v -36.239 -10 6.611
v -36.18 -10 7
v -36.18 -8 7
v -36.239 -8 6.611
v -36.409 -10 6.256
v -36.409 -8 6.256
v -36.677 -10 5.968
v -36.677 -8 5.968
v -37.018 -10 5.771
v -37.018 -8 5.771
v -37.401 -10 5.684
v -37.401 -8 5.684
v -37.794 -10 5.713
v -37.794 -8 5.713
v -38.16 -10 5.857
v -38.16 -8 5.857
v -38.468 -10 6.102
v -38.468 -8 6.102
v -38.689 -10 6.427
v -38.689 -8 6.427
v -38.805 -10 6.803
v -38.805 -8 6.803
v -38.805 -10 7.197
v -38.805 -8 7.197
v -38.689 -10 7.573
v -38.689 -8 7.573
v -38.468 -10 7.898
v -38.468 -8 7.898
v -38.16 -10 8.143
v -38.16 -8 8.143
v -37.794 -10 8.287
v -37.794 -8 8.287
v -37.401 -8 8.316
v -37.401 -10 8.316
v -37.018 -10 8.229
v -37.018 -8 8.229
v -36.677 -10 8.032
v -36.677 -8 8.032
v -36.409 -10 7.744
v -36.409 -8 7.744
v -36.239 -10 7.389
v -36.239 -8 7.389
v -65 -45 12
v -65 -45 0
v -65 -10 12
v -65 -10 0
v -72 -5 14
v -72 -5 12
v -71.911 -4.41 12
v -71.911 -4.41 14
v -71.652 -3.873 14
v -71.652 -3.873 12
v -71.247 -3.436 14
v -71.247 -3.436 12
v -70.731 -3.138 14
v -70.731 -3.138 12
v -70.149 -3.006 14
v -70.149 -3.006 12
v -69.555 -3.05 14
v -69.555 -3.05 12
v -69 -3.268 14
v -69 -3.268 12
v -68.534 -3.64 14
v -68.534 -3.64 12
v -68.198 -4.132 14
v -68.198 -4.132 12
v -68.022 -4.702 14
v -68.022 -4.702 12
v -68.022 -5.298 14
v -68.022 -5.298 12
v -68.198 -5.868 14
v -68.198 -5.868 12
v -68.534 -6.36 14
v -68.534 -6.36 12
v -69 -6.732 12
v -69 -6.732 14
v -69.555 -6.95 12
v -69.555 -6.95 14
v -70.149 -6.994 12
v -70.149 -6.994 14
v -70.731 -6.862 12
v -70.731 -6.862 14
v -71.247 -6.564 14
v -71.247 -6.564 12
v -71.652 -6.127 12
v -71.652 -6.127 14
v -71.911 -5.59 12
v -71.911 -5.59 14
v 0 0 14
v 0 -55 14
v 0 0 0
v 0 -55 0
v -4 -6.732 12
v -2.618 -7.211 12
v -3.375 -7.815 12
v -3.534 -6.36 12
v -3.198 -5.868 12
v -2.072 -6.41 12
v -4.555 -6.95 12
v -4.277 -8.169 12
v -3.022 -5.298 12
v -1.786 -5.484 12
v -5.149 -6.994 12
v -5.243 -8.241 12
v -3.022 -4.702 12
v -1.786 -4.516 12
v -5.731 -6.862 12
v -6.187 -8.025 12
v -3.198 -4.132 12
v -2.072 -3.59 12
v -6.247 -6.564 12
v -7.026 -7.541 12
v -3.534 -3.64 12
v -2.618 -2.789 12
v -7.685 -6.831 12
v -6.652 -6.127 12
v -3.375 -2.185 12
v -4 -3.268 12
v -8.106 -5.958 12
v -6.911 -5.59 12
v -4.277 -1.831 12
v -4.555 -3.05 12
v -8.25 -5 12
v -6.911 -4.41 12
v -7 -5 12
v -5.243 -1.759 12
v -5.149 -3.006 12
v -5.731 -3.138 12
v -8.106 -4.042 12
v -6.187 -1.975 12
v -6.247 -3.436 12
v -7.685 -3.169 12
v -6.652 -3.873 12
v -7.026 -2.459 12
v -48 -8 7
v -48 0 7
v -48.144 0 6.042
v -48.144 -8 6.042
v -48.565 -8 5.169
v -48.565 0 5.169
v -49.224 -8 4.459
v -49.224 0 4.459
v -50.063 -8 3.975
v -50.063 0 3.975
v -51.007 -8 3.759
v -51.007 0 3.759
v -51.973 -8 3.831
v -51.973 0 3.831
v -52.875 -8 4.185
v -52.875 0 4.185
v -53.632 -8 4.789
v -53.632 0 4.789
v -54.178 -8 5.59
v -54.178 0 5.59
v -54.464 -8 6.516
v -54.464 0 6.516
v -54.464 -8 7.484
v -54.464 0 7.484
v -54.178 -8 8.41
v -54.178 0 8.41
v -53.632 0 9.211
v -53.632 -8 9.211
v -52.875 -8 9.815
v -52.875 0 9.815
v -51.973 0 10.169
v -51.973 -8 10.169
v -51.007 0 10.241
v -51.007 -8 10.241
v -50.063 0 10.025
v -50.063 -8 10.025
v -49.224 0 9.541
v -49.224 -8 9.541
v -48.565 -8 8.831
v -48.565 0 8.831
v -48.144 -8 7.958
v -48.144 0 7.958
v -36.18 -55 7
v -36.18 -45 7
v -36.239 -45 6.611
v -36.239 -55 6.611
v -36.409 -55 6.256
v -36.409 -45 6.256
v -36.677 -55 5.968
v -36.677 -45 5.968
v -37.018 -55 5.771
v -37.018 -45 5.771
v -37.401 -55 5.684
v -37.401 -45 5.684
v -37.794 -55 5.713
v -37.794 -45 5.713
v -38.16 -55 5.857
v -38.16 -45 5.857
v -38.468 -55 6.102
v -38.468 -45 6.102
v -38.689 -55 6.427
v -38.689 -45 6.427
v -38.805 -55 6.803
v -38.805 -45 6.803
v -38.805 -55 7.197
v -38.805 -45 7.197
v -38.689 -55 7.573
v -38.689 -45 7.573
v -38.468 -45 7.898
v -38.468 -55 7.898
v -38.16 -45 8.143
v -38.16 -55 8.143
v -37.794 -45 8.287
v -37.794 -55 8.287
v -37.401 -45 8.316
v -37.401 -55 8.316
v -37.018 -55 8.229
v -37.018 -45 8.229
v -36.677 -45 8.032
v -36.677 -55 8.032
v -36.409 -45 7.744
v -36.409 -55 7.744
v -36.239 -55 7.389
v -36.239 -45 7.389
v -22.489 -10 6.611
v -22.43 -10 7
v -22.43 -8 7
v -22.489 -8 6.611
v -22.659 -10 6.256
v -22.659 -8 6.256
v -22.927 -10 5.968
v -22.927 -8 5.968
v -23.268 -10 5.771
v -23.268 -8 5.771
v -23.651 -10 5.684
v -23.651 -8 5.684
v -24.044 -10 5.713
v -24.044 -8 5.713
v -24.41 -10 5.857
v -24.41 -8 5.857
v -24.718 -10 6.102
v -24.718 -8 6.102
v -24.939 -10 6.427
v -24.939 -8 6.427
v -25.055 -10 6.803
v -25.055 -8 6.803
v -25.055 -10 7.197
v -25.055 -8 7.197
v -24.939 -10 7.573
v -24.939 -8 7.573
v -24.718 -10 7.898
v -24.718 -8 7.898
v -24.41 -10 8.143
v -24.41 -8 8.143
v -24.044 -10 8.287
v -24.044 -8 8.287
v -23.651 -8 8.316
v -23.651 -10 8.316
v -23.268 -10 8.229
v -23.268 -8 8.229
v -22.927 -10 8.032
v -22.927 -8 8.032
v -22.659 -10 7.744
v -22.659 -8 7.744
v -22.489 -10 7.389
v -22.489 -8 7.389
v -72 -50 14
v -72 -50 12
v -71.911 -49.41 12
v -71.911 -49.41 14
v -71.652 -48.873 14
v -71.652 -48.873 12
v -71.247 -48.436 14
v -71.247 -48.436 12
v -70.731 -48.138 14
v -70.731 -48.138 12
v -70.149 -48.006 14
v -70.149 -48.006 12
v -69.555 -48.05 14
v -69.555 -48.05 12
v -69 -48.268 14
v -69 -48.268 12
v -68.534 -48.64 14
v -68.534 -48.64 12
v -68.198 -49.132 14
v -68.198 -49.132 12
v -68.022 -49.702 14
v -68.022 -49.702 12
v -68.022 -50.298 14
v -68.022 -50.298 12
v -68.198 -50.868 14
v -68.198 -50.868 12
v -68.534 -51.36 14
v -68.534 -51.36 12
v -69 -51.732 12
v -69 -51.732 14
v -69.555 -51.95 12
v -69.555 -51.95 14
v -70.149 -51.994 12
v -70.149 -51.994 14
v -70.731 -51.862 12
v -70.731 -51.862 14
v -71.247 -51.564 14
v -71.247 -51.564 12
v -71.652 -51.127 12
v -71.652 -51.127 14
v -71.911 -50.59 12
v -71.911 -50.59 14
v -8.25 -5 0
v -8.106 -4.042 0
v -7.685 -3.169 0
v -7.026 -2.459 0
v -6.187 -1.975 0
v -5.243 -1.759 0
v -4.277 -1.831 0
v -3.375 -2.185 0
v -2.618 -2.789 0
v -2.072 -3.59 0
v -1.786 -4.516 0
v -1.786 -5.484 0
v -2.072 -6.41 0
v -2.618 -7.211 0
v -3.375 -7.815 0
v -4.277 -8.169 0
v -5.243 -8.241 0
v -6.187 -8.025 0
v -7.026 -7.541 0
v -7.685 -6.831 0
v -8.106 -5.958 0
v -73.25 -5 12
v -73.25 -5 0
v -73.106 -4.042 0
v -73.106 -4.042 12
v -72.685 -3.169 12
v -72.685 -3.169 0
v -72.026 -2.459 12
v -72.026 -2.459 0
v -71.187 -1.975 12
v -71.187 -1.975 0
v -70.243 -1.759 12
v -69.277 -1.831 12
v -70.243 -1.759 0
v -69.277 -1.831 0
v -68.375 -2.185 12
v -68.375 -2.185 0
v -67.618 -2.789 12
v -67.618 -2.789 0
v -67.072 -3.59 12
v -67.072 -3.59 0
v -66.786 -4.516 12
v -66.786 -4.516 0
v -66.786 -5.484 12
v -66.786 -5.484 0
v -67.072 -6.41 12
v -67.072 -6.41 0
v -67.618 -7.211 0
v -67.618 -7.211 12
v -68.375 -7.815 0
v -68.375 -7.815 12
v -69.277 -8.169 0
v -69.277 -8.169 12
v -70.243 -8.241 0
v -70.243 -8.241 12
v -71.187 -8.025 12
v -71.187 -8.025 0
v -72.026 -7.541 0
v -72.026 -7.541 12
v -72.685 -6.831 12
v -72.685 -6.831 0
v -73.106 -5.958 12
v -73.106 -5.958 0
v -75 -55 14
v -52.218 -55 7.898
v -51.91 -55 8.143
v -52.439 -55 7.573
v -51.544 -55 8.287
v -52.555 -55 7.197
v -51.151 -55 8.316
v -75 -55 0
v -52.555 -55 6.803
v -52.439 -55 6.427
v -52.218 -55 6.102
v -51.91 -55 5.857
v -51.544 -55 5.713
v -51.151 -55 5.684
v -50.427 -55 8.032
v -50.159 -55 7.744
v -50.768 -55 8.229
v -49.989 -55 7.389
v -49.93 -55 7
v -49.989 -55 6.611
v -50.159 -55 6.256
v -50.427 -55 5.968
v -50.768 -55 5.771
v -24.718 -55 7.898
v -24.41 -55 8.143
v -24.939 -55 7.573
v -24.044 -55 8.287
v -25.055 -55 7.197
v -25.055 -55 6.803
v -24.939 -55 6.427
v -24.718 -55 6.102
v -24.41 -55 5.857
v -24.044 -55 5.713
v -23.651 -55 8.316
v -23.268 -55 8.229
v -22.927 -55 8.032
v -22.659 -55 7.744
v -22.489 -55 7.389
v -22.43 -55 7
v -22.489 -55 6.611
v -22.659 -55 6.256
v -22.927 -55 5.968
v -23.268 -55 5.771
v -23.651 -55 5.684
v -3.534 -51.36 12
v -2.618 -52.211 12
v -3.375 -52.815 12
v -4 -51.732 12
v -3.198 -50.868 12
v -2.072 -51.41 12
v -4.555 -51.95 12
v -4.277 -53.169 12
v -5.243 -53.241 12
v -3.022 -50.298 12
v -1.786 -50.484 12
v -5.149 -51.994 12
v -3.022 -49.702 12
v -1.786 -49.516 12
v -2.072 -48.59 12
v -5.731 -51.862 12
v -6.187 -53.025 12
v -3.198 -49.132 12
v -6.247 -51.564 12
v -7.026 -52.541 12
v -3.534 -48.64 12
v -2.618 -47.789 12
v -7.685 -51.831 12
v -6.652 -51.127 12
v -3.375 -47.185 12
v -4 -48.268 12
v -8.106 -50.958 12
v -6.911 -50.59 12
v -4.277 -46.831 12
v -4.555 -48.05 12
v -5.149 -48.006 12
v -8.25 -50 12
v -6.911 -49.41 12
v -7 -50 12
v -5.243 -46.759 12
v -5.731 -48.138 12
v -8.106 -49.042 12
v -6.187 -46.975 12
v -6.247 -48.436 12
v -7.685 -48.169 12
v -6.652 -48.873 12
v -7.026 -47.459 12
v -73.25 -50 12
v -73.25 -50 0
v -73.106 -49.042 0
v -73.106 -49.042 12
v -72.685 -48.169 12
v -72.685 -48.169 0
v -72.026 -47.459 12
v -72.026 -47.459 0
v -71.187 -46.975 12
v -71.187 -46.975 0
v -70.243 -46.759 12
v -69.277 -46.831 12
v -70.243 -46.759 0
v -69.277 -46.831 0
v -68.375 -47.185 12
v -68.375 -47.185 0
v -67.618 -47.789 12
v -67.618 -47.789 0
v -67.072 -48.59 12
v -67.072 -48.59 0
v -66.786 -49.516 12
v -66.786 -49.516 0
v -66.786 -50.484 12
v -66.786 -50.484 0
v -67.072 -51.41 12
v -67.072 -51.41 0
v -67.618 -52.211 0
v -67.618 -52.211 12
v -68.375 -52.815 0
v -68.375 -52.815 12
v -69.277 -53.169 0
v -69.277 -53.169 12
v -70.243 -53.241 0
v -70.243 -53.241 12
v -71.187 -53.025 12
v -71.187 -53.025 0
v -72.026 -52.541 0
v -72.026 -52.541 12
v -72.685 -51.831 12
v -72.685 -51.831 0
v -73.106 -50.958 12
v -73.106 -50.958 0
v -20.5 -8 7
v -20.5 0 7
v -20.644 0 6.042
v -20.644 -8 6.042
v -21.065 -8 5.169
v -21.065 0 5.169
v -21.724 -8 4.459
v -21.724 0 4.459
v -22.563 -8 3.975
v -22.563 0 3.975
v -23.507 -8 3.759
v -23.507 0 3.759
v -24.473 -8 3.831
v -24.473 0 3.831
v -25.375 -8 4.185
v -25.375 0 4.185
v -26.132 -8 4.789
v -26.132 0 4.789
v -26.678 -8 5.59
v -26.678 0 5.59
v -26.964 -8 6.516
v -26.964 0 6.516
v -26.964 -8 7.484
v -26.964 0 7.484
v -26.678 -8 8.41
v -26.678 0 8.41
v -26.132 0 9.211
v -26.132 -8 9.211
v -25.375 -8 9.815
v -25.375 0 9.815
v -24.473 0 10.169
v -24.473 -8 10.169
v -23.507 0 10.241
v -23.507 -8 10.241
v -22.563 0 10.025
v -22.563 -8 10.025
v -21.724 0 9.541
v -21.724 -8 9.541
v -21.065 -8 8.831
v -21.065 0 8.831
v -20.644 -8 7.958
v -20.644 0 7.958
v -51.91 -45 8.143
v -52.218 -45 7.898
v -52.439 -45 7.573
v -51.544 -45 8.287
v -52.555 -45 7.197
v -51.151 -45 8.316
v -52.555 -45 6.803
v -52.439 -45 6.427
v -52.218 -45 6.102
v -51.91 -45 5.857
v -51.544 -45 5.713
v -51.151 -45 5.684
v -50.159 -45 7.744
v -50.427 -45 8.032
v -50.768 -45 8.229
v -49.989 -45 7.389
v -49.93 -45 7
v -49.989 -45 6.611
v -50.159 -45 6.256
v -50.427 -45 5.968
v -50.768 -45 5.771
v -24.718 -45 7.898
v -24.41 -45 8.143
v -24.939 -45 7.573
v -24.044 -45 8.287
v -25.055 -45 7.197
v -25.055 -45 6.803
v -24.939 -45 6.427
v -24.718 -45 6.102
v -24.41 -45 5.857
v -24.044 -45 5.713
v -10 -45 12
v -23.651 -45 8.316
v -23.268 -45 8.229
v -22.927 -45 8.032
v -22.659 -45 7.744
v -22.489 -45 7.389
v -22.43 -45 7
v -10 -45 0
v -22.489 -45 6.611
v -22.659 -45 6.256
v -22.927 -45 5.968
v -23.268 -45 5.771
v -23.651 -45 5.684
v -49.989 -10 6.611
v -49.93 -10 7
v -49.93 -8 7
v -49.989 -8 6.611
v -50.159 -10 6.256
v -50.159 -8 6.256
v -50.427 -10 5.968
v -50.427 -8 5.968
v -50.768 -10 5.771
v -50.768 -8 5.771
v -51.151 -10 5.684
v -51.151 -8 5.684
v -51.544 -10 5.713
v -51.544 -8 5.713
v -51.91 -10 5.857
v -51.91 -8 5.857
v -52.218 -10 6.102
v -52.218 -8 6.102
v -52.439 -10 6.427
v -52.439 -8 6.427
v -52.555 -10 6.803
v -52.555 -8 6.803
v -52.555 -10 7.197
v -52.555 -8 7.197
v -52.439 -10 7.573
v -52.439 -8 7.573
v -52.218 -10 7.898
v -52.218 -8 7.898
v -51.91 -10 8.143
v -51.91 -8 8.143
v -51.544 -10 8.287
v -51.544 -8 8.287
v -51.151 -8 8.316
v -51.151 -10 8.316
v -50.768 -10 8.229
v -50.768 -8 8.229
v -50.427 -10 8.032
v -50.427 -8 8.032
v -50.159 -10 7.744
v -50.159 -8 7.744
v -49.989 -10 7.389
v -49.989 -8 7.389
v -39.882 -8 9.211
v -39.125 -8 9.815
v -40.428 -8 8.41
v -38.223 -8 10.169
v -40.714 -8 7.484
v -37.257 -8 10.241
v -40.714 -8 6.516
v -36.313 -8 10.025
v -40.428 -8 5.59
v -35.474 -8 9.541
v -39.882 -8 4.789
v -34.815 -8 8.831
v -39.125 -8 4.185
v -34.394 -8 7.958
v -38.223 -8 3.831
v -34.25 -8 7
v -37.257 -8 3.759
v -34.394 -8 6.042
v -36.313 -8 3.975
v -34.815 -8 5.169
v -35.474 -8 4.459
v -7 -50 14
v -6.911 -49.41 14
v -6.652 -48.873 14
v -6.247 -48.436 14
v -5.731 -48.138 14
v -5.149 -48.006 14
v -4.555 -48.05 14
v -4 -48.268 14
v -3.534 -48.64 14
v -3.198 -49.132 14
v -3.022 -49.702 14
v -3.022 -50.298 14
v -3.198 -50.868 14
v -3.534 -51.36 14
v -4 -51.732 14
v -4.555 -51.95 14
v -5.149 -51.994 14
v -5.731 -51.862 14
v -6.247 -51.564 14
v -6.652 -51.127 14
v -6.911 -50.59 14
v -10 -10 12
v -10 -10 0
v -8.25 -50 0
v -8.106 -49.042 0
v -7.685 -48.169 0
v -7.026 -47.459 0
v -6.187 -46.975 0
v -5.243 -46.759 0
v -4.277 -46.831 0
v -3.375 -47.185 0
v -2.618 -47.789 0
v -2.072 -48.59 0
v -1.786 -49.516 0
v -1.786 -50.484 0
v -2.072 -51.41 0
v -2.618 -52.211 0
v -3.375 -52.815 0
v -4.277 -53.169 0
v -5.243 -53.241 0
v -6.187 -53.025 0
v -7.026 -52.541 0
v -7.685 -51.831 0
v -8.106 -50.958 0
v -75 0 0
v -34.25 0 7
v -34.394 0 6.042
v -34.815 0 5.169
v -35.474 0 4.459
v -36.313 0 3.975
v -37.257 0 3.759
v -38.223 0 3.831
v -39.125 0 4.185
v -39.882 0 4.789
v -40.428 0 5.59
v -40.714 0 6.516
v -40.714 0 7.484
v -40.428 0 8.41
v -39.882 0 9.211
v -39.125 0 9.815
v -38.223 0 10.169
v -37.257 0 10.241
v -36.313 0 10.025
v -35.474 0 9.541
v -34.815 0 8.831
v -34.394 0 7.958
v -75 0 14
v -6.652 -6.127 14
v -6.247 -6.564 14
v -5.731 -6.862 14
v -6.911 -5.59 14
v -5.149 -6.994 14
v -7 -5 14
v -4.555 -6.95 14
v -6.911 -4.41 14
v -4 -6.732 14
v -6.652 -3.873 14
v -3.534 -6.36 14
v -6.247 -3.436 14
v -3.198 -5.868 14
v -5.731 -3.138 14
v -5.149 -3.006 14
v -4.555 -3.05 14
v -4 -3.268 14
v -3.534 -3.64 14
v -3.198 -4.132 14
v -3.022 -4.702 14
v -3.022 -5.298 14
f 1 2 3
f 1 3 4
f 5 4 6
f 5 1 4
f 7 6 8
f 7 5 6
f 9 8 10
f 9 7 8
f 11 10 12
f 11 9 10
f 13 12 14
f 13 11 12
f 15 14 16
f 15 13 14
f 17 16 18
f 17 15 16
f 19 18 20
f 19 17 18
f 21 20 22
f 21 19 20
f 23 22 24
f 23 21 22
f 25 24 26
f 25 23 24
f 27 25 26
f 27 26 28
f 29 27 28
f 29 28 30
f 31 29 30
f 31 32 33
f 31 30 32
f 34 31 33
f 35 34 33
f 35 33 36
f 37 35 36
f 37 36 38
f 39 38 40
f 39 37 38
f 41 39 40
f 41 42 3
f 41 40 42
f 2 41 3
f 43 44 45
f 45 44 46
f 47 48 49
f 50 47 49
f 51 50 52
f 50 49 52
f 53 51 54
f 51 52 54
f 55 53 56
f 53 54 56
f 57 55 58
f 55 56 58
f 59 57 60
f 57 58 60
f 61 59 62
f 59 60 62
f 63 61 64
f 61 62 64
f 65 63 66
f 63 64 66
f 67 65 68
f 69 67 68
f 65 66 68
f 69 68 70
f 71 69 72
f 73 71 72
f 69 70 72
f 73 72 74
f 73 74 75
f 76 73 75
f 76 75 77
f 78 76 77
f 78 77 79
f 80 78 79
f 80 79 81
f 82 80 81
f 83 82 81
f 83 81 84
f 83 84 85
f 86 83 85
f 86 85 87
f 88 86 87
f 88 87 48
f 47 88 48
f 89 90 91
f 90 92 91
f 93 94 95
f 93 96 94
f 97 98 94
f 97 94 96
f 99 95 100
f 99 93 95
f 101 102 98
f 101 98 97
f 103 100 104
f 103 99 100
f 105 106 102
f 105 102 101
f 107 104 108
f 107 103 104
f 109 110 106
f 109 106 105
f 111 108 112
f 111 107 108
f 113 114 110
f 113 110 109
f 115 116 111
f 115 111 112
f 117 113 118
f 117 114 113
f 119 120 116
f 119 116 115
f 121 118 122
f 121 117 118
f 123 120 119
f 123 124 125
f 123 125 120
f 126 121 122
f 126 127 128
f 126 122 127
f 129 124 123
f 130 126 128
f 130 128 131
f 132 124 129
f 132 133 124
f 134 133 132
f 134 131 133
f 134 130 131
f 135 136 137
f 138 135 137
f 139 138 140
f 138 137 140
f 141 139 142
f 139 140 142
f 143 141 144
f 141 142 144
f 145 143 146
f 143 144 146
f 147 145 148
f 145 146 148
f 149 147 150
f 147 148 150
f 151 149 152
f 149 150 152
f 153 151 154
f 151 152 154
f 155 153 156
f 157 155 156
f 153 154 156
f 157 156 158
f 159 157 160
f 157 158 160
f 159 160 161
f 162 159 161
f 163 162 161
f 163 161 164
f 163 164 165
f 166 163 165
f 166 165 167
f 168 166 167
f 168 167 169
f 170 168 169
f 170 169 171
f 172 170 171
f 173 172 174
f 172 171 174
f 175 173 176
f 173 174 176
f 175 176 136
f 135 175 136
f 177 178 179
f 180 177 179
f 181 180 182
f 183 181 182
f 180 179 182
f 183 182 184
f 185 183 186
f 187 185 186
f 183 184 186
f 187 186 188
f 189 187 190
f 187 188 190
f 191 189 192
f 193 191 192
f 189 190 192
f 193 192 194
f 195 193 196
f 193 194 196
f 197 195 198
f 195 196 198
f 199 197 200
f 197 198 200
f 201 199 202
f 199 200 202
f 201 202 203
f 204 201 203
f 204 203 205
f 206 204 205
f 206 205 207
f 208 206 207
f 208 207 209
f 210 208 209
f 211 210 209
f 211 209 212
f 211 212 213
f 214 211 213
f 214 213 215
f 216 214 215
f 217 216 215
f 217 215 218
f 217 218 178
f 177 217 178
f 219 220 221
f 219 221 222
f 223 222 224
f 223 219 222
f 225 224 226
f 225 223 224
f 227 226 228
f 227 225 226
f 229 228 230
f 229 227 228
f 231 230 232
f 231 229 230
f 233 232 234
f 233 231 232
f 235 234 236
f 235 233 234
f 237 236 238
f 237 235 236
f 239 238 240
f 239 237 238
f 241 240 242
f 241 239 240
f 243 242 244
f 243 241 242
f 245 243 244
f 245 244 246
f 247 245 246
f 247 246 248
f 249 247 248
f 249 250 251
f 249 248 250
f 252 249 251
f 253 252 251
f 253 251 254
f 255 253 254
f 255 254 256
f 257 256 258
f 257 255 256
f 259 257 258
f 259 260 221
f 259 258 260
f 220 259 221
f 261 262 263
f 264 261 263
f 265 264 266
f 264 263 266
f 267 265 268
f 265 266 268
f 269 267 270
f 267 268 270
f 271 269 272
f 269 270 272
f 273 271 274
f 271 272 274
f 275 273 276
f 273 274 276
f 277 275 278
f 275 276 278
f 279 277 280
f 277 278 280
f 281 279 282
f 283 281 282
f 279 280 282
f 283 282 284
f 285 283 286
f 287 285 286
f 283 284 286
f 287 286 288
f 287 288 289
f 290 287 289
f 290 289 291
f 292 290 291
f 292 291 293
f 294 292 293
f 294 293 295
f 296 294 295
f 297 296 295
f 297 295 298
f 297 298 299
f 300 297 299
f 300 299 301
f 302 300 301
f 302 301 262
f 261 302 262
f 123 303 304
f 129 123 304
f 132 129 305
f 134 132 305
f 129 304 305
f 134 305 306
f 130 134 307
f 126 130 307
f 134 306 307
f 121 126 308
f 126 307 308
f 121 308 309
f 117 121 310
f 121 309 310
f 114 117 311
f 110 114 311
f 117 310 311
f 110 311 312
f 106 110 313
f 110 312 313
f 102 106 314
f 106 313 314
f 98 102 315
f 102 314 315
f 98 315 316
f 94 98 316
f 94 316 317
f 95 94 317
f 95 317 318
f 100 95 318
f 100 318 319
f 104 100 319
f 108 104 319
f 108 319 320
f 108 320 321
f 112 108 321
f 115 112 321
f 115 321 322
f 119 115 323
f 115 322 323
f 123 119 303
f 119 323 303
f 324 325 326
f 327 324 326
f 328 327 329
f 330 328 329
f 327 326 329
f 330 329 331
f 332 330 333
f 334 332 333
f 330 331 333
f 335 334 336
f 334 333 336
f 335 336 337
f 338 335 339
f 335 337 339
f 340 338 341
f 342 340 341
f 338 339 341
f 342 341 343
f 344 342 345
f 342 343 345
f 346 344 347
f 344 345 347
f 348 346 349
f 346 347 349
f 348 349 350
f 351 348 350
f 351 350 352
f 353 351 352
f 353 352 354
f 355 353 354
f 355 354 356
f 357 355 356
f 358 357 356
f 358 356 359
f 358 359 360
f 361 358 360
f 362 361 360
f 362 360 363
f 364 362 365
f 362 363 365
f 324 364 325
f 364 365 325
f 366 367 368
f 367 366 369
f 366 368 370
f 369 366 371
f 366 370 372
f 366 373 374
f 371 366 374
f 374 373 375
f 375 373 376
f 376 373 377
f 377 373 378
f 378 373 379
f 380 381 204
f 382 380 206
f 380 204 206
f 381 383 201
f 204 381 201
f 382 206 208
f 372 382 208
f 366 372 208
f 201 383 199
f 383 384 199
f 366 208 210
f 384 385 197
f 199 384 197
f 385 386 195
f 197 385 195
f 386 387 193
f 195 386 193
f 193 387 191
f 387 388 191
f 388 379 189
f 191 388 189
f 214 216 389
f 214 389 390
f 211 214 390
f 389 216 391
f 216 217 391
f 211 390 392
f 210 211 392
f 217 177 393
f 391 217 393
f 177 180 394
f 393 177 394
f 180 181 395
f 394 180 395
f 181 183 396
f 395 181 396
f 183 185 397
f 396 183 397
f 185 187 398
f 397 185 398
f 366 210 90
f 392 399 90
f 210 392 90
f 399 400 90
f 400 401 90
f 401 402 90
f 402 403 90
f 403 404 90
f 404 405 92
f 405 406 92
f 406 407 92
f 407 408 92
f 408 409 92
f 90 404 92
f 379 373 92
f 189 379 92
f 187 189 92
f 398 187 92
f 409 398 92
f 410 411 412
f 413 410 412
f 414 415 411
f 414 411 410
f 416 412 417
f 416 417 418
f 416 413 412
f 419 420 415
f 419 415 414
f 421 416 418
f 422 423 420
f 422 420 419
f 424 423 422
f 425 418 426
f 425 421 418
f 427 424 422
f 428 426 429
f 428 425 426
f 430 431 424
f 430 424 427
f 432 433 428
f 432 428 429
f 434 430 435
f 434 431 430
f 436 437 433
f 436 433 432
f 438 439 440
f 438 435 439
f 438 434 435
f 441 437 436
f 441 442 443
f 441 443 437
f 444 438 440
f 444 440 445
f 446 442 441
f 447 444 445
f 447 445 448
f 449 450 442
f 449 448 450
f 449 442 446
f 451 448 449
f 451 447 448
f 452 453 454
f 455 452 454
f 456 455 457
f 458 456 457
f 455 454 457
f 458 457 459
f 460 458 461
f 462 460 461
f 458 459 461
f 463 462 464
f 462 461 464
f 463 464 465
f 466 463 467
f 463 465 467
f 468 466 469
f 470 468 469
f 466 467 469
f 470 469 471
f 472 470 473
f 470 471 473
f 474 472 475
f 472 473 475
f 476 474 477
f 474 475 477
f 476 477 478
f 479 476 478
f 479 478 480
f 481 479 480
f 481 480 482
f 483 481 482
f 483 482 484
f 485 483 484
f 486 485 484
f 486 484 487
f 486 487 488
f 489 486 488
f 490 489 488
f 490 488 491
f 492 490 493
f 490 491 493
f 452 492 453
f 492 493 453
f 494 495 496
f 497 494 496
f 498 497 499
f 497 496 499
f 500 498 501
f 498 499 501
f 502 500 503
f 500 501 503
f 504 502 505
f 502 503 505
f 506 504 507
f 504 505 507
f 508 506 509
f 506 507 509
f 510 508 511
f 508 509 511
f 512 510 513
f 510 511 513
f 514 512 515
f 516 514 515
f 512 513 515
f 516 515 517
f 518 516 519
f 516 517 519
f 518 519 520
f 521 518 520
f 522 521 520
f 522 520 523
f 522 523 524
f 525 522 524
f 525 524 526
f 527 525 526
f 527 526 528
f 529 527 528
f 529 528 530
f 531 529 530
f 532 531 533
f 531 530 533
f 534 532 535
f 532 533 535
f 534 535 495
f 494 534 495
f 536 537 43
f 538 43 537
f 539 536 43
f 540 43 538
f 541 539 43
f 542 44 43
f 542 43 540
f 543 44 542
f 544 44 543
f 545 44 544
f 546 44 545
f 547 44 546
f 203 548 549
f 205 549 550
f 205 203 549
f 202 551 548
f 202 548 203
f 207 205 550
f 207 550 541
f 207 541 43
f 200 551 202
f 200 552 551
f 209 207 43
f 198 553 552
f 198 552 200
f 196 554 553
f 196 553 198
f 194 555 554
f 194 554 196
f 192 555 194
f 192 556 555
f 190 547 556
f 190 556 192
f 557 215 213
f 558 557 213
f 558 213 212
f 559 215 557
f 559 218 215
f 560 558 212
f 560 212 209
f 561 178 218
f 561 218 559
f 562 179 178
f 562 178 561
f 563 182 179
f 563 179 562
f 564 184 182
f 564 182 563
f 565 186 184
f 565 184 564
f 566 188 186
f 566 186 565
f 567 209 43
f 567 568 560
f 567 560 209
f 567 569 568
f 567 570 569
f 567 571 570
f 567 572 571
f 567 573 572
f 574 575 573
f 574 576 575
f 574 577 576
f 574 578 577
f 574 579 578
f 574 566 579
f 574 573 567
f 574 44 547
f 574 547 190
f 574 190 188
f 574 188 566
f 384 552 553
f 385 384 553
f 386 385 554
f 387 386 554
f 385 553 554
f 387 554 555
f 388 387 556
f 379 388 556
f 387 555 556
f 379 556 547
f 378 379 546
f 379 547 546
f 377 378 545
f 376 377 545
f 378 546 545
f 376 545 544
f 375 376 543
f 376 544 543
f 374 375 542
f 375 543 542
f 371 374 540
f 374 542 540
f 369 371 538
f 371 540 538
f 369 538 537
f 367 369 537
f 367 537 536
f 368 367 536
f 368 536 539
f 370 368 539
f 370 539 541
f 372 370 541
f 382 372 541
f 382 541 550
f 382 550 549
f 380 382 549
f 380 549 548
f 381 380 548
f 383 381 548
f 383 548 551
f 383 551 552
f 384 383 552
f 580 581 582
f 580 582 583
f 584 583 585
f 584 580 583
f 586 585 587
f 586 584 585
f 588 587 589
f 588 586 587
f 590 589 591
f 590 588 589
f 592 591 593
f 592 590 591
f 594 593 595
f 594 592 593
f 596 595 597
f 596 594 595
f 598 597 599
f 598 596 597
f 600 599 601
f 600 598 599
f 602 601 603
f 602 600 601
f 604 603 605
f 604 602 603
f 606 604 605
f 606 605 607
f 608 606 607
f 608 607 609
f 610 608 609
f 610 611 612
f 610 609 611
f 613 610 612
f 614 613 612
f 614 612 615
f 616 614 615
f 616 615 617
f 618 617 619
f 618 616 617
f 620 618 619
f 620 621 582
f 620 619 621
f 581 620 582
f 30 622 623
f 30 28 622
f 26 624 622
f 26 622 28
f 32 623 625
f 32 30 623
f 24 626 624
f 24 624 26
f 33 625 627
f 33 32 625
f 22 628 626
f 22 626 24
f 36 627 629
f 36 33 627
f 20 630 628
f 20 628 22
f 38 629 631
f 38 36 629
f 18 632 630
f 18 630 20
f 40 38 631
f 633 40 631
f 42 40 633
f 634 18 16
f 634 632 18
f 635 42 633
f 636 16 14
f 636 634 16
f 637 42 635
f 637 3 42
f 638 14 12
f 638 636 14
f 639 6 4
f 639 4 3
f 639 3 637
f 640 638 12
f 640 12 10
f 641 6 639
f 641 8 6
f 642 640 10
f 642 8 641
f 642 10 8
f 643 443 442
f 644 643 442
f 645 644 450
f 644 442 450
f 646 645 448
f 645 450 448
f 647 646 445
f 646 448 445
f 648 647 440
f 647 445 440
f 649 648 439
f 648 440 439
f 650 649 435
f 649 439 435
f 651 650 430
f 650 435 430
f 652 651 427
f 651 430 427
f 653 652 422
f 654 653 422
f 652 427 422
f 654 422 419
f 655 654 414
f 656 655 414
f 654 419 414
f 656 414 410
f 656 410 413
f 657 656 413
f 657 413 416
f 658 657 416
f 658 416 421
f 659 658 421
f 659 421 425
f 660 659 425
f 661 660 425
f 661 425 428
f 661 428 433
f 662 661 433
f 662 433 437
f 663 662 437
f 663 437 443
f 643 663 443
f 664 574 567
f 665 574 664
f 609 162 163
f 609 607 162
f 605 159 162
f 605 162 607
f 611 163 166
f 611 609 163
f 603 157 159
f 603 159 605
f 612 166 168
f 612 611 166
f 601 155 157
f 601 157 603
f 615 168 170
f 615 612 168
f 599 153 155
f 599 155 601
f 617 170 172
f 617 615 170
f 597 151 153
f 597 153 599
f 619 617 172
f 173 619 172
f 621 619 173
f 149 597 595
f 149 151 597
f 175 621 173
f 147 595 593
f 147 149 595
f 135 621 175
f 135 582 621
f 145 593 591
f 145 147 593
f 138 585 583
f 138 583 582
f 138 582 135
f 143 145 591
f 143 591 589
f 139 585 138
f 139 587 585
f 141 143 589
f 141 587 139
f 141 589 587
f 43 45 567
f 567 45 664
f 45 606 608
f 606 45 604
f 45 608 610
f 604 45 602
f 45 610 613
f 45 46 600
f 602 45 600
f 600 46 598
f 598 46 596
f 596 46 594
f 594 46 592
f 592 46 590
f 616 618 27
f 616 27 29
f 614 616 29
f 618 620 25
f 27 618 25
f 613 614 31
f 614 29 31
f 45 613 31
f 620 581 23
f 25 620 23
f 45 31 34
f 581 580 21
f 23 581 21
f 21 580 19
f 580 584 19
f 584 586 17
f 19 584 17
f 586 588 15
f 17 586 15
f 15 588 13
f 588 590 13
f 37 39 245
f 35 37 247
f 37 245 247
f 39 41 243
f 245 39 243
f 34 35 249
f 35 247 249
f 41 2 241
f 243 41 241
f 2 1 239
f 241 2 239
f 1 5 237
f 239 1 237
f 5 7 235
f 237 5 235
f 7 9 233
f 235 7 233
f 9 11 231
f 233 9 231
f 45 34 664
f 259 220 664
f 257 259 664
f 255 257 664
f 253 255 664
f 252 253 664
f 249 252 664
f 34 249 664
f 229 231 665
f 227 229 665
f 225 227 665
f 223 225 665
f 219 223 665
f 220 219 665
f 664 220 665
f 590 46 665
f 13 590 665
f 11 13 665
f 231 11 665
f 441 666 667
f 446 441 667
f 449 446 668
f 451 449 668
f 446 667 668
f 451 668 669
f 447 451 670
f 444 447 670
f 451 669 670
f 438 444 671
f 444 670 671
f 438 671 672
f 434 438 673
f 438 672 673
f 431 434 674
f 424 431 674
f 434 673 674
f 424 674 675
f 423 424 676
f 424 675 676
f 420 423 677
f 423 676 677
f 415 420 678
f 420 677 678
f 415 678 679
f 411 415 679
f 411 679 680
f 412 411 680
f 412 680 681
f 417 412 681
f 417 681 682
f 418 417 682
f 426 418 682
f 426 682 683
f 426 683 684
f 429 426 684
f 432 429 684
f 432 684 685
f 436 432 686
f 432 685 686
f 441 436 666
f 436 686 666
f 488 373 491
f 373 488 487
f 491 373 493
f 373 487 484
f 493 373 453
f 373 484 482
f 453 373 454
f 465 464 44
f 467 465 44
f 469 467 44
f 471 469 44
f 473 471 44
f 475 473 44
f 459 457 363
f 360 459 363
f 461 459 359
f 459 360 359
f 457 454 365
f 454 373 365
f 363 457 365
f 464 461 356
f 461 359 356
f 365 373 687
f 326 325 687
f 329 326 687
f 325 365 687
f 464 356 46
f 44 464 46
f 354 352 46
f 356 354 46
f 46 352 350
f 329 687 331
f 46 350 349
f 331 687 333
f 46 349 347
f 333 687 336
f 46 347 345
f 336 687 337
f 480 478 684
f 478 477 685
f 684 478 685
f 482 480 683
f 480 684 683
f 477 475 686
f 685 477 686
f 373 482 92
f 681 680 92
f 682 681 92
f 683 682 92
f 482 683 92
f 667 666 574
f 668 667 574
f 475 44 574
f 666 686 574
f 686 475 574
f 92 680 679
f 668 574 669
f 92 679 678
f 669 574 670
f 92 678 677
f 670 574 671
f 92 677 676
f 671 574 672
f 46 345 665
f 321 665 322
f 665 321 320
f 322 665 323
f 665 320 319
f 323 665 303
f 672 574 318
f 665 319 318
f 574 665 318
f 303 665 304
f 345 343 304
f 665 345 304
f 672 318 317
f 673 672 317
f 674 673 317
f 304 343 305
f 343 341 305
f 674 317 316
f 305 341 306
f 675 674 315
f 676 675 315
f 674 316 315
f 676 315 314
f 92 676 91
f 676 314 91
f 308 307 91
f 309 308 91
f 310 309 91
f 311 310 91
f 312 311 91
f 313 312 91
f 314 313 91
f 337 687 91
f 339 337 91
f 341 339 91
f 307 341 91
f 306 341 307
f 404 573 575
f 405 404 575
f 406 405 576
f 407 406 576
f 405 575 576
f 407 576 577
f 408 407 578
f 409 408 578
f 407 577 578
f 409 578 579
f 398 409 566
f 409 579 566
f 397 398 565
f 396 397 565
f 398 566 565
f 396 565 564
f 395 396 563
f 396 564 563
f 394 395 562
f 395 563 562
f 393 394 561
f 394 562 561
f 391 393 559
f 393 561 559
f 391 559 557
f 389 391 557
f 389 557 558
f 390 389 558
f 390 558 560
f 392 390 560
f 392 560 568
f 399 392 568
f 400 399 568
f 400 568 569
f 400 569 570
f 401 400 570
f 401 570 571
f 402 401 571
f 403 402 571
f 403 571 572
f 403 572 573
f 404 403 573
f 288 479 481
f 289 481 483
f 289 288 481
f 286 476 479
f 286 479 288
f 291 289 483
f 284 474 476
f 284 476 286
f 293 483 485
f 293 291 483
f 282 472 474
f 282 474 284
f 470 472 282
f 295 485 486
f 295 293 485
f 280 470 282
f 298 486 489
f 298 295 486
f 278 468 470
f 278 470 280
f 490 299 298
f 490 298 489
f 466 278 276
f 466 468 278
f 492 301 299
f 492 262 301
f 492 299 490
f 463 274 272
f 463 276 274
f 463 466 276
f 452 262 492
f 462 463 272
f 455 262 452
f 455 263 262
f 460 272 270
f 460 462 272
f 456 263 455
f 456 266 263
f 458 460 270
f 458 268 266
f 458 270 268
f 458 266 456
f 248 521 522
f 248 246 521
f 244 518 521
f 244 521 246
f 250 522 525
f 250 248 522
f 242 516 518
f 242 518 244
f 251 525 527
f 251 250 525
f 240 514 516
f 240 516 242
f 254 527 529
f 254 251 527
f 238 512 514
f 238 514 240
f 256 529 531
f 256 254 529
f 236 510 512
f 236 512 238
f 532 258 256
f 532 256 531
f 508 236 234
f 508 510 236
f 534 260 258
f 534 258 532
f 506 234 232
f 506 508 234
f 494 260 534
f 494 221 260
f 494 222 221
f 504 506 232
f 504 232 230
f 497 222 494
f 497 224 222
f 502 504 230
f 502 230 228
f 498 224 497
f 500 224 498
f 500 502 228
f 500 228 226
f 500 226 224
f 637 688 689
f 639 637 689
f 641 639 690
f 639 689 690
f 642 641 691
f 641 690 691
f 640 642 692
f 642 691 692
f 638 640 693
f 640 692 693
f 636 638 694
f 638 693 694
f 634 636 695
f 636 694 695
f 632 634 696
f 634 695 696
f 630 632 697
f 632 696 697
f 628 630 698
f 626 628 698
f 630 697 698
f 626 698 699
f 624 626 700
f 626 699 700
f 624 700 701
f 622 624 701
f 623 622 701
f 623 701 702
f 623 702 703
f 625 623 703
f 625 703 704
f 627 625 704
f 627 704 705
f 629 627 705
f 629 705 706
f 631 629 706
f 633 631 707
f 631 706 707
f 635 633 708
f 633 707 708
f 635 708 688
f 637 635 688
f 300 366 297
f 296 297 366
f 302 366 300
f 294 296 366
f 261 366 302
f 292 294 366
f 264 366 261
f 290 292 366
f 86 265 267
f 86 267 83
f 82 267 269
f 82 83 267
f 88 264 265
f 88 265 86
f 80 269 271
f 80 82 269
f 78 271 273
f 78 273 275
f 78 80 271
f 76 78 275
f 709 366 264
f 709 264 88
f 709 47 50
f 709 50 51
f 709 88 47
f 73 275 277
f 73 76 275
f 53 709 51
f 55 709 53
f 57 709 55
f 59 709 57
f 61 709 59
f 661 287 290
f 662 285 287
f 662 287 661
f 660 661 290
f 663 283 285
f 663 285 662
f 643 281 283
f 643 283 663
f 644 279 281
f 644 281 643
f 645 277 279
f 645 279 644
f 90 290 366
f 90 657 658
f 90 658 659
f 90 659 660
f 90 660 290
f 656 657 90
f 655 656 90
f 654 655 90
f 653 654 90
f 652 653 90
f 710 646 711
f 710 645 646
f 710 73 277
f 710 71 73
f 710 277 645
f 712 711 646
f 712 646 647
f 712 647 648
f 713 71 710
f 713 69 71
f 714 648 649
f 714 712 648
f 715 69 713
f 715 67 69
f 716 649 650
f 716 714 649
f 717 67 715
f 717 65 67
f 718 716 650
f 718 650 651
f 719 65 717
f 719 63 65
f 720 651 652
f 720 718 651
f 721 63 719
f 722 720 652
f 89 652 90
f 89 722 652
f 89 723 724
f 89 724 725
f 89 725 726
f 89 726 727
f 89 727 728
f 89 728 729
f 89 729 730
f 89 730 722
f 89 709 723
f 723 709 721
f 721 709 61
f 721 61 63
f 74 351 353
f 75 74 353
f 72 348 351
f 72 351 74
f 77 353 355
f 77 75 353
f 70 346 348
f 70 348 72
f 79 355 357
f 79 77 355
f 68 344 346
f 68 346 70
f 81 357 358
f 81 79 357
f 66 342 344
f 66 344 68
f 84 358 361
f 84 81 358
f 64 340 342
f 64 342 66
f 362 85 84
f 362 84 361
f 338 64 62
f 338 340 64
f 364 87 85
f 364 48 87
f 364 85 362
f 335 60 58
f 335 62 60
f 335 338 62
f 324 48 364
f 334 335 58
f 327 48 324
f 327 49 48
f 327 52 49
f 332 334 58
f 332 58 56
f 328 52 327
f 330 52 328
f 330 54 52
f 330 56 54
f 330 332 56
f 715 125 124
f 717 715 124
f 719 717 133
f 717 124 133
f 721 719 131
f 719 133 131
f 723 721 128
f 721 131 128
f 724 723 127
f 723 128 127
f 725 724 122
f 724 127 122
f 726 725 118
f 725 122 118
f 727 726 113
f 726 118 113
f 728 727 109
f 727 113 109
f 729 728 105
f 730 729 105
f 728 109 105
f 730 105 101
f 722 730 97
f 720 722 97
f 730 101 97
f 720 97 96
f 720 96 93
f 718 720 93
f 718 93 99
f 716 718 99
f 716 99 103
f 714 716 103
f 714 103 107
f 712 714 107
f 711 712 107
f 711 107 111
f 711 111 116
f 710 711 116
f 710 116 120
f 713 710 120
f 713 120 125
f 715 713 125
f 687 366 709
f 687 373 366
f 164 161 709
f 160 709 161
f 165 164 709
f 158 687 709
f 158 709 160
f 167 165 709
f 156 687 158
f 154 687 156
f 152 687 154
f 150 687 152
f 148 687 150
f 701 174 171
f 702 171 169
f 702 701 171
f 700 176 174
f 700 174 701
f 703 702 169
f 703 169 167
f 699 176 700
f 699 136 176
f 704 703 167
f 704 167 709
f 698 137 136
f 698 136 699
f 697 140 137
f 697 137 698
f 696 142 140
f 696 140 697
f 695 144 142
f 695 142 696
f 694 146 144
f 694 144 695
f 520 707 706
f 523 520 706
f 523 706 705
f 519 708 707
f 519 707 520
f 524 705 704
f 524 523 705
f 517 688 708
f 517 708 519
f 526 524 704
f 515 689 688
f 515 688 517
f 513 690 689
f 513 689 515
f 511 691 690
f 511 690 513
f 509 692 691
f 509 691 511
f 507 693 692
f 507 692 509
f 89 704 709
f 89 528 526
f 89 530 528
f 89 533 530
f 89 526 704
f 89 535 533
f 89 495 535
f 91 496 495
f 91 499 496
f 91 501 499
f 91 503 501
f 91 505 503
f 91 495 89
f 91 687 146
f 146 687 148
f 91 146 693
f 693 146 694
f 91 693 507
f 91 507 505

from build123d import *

# Parameters (mm, degrees)
SKETCH2_W               = 75
SKETCH2_H               = 55
SKETCH2_W_2             = 55
SKETCH2_H_2             = 35
BOSS_EXTRUDE1_DEPTH     = 12
SKETCH3_W               = 75
SKETCH3_H               = 55
BOSS_EXTRUDE2_DEPTH     = 2
SKETCH5_R               = 1.32
CUT_EXTRUDE1_DEPTH      = 46
CUT_EXTRUDE1_DEPTH_BACK = 11
SKETCH6_R               = 3.25
CUT_EXTRUDE2_DEPTH      = 8
SKETCH8_R               = 3.25
CUT_EXTRUDE4_DEPTH      = 12
SKETCH9_R               = 2
CUT_EXTRUDE5_DEPTH      = 15


with BuildPart() as part:
    # Sketch2 → Boss-Extrude1 (new body)
    with BuildSketch(Plane.XY):
        with Locations((-37.5, -27.5)):
            Rectangle(SKETCH2_W, SKETCH2_H)
        with Locations((-37.5, -27.5)):
            Rectangle(SKETCH2_W_2, SKETCH2_H_2, mode=Mode.SUBTRACT)
    extrude(amount=BOSS_EXTRUDE1_DEPTH)

    # Sketch3 → Boss-Extrude2 (add)
    with BuildSketch(Plane.XY.offset(12)):
        with Locations((-37.5, -27.5)):
            Rectangle(SKETCH3_W, SKETCH3_H)
    extrude(amount=BOSS_EXTRUDE2_DEPTH)

    # Sketch5 → Cut-Extrude1 (cut, two sides)
    with BuildSketch(Plane(origin=(0, -45, 0), x_dir=(1, 0, 0), z_dir=(0, 1, 0))) as cut_extrude1_sk:
        with Locations((-51.25, -7)):
            Circle(SKETCH5_R)
        with Locations((-23.75, -7)):
            Circle(SKETCH5_R)
        with Locations((-37.5, -7)):
            Circle(SKETCH5_R)
    extrude(amount=CUT_EXTRUDE1_DEPTH, mode=Mode.SUBTRACT)
    extrude(cut_extrude1_sk.sketch, amount=-CUT_EXTRUDE1_DEPTH_BACK, mode=Mode.SUBTRACT)

    # Sketch6 → Cut-Extrude2 (cut)
    with BuildSketch(Plane(origin=(0, 0, 0), x_dir=(1, 0, 0), z_dir=(0, 1, 0))):
        with Locations((-51.25, -7)):
            Circle(SKETCH6_R)
        with Locations((-37.5, -7)):
            Circle(SKETCH6_R)
        with Locations((-23.75, -7)):
            Circle(SKETCH6_R)
    extrude(amount=-CUT_EXTRUDE2_DEPTH, mode=Mode.SUBTRACT)

    # Sketch8 → Cut-Extrude4 (cut)
    with BuildSketch(Plane(origin=(0, 0, 0), x_dir=(-1, 0, 0), z_dir=(0, 0, -1))):
        with Locations((5, -5)):
            Circle(SKETCH8_R)
        with Locations((70, -5)):
            Circle(SKETCH8_R)
        with Locations((70, -50)):
            Circle(SKETCH8_R)
        with Locations((5, -50)):
            Circle(SKETCH8_R)
    extrude(amount=-CUT_EXTRUDE4_DEPTH, mode=Mode.SUBTRACT)

    # Sketch9 → Cut-Extrude5 (cut, through all)
    with BuildSketch(Plane(origin=(0, 0, 0), x_dir=(-1, 0, 0), z_dir=(0, 0, -1))):
        with Locations((5, -5)):
            Circle(SKETCH9_R)
        with Locations((70, -5)):
            Circle(SKETCH9_R)
        with Locations((70, -50)):
            Circle(SKETCH9_R)
        with Locations((5, -50)):
            Circle(SKETCH9_R)
    extrude(amount=-CUT_EXTRUDE5_DEPTH, mode=Mode.SUBTRACT)


solid = part.part
